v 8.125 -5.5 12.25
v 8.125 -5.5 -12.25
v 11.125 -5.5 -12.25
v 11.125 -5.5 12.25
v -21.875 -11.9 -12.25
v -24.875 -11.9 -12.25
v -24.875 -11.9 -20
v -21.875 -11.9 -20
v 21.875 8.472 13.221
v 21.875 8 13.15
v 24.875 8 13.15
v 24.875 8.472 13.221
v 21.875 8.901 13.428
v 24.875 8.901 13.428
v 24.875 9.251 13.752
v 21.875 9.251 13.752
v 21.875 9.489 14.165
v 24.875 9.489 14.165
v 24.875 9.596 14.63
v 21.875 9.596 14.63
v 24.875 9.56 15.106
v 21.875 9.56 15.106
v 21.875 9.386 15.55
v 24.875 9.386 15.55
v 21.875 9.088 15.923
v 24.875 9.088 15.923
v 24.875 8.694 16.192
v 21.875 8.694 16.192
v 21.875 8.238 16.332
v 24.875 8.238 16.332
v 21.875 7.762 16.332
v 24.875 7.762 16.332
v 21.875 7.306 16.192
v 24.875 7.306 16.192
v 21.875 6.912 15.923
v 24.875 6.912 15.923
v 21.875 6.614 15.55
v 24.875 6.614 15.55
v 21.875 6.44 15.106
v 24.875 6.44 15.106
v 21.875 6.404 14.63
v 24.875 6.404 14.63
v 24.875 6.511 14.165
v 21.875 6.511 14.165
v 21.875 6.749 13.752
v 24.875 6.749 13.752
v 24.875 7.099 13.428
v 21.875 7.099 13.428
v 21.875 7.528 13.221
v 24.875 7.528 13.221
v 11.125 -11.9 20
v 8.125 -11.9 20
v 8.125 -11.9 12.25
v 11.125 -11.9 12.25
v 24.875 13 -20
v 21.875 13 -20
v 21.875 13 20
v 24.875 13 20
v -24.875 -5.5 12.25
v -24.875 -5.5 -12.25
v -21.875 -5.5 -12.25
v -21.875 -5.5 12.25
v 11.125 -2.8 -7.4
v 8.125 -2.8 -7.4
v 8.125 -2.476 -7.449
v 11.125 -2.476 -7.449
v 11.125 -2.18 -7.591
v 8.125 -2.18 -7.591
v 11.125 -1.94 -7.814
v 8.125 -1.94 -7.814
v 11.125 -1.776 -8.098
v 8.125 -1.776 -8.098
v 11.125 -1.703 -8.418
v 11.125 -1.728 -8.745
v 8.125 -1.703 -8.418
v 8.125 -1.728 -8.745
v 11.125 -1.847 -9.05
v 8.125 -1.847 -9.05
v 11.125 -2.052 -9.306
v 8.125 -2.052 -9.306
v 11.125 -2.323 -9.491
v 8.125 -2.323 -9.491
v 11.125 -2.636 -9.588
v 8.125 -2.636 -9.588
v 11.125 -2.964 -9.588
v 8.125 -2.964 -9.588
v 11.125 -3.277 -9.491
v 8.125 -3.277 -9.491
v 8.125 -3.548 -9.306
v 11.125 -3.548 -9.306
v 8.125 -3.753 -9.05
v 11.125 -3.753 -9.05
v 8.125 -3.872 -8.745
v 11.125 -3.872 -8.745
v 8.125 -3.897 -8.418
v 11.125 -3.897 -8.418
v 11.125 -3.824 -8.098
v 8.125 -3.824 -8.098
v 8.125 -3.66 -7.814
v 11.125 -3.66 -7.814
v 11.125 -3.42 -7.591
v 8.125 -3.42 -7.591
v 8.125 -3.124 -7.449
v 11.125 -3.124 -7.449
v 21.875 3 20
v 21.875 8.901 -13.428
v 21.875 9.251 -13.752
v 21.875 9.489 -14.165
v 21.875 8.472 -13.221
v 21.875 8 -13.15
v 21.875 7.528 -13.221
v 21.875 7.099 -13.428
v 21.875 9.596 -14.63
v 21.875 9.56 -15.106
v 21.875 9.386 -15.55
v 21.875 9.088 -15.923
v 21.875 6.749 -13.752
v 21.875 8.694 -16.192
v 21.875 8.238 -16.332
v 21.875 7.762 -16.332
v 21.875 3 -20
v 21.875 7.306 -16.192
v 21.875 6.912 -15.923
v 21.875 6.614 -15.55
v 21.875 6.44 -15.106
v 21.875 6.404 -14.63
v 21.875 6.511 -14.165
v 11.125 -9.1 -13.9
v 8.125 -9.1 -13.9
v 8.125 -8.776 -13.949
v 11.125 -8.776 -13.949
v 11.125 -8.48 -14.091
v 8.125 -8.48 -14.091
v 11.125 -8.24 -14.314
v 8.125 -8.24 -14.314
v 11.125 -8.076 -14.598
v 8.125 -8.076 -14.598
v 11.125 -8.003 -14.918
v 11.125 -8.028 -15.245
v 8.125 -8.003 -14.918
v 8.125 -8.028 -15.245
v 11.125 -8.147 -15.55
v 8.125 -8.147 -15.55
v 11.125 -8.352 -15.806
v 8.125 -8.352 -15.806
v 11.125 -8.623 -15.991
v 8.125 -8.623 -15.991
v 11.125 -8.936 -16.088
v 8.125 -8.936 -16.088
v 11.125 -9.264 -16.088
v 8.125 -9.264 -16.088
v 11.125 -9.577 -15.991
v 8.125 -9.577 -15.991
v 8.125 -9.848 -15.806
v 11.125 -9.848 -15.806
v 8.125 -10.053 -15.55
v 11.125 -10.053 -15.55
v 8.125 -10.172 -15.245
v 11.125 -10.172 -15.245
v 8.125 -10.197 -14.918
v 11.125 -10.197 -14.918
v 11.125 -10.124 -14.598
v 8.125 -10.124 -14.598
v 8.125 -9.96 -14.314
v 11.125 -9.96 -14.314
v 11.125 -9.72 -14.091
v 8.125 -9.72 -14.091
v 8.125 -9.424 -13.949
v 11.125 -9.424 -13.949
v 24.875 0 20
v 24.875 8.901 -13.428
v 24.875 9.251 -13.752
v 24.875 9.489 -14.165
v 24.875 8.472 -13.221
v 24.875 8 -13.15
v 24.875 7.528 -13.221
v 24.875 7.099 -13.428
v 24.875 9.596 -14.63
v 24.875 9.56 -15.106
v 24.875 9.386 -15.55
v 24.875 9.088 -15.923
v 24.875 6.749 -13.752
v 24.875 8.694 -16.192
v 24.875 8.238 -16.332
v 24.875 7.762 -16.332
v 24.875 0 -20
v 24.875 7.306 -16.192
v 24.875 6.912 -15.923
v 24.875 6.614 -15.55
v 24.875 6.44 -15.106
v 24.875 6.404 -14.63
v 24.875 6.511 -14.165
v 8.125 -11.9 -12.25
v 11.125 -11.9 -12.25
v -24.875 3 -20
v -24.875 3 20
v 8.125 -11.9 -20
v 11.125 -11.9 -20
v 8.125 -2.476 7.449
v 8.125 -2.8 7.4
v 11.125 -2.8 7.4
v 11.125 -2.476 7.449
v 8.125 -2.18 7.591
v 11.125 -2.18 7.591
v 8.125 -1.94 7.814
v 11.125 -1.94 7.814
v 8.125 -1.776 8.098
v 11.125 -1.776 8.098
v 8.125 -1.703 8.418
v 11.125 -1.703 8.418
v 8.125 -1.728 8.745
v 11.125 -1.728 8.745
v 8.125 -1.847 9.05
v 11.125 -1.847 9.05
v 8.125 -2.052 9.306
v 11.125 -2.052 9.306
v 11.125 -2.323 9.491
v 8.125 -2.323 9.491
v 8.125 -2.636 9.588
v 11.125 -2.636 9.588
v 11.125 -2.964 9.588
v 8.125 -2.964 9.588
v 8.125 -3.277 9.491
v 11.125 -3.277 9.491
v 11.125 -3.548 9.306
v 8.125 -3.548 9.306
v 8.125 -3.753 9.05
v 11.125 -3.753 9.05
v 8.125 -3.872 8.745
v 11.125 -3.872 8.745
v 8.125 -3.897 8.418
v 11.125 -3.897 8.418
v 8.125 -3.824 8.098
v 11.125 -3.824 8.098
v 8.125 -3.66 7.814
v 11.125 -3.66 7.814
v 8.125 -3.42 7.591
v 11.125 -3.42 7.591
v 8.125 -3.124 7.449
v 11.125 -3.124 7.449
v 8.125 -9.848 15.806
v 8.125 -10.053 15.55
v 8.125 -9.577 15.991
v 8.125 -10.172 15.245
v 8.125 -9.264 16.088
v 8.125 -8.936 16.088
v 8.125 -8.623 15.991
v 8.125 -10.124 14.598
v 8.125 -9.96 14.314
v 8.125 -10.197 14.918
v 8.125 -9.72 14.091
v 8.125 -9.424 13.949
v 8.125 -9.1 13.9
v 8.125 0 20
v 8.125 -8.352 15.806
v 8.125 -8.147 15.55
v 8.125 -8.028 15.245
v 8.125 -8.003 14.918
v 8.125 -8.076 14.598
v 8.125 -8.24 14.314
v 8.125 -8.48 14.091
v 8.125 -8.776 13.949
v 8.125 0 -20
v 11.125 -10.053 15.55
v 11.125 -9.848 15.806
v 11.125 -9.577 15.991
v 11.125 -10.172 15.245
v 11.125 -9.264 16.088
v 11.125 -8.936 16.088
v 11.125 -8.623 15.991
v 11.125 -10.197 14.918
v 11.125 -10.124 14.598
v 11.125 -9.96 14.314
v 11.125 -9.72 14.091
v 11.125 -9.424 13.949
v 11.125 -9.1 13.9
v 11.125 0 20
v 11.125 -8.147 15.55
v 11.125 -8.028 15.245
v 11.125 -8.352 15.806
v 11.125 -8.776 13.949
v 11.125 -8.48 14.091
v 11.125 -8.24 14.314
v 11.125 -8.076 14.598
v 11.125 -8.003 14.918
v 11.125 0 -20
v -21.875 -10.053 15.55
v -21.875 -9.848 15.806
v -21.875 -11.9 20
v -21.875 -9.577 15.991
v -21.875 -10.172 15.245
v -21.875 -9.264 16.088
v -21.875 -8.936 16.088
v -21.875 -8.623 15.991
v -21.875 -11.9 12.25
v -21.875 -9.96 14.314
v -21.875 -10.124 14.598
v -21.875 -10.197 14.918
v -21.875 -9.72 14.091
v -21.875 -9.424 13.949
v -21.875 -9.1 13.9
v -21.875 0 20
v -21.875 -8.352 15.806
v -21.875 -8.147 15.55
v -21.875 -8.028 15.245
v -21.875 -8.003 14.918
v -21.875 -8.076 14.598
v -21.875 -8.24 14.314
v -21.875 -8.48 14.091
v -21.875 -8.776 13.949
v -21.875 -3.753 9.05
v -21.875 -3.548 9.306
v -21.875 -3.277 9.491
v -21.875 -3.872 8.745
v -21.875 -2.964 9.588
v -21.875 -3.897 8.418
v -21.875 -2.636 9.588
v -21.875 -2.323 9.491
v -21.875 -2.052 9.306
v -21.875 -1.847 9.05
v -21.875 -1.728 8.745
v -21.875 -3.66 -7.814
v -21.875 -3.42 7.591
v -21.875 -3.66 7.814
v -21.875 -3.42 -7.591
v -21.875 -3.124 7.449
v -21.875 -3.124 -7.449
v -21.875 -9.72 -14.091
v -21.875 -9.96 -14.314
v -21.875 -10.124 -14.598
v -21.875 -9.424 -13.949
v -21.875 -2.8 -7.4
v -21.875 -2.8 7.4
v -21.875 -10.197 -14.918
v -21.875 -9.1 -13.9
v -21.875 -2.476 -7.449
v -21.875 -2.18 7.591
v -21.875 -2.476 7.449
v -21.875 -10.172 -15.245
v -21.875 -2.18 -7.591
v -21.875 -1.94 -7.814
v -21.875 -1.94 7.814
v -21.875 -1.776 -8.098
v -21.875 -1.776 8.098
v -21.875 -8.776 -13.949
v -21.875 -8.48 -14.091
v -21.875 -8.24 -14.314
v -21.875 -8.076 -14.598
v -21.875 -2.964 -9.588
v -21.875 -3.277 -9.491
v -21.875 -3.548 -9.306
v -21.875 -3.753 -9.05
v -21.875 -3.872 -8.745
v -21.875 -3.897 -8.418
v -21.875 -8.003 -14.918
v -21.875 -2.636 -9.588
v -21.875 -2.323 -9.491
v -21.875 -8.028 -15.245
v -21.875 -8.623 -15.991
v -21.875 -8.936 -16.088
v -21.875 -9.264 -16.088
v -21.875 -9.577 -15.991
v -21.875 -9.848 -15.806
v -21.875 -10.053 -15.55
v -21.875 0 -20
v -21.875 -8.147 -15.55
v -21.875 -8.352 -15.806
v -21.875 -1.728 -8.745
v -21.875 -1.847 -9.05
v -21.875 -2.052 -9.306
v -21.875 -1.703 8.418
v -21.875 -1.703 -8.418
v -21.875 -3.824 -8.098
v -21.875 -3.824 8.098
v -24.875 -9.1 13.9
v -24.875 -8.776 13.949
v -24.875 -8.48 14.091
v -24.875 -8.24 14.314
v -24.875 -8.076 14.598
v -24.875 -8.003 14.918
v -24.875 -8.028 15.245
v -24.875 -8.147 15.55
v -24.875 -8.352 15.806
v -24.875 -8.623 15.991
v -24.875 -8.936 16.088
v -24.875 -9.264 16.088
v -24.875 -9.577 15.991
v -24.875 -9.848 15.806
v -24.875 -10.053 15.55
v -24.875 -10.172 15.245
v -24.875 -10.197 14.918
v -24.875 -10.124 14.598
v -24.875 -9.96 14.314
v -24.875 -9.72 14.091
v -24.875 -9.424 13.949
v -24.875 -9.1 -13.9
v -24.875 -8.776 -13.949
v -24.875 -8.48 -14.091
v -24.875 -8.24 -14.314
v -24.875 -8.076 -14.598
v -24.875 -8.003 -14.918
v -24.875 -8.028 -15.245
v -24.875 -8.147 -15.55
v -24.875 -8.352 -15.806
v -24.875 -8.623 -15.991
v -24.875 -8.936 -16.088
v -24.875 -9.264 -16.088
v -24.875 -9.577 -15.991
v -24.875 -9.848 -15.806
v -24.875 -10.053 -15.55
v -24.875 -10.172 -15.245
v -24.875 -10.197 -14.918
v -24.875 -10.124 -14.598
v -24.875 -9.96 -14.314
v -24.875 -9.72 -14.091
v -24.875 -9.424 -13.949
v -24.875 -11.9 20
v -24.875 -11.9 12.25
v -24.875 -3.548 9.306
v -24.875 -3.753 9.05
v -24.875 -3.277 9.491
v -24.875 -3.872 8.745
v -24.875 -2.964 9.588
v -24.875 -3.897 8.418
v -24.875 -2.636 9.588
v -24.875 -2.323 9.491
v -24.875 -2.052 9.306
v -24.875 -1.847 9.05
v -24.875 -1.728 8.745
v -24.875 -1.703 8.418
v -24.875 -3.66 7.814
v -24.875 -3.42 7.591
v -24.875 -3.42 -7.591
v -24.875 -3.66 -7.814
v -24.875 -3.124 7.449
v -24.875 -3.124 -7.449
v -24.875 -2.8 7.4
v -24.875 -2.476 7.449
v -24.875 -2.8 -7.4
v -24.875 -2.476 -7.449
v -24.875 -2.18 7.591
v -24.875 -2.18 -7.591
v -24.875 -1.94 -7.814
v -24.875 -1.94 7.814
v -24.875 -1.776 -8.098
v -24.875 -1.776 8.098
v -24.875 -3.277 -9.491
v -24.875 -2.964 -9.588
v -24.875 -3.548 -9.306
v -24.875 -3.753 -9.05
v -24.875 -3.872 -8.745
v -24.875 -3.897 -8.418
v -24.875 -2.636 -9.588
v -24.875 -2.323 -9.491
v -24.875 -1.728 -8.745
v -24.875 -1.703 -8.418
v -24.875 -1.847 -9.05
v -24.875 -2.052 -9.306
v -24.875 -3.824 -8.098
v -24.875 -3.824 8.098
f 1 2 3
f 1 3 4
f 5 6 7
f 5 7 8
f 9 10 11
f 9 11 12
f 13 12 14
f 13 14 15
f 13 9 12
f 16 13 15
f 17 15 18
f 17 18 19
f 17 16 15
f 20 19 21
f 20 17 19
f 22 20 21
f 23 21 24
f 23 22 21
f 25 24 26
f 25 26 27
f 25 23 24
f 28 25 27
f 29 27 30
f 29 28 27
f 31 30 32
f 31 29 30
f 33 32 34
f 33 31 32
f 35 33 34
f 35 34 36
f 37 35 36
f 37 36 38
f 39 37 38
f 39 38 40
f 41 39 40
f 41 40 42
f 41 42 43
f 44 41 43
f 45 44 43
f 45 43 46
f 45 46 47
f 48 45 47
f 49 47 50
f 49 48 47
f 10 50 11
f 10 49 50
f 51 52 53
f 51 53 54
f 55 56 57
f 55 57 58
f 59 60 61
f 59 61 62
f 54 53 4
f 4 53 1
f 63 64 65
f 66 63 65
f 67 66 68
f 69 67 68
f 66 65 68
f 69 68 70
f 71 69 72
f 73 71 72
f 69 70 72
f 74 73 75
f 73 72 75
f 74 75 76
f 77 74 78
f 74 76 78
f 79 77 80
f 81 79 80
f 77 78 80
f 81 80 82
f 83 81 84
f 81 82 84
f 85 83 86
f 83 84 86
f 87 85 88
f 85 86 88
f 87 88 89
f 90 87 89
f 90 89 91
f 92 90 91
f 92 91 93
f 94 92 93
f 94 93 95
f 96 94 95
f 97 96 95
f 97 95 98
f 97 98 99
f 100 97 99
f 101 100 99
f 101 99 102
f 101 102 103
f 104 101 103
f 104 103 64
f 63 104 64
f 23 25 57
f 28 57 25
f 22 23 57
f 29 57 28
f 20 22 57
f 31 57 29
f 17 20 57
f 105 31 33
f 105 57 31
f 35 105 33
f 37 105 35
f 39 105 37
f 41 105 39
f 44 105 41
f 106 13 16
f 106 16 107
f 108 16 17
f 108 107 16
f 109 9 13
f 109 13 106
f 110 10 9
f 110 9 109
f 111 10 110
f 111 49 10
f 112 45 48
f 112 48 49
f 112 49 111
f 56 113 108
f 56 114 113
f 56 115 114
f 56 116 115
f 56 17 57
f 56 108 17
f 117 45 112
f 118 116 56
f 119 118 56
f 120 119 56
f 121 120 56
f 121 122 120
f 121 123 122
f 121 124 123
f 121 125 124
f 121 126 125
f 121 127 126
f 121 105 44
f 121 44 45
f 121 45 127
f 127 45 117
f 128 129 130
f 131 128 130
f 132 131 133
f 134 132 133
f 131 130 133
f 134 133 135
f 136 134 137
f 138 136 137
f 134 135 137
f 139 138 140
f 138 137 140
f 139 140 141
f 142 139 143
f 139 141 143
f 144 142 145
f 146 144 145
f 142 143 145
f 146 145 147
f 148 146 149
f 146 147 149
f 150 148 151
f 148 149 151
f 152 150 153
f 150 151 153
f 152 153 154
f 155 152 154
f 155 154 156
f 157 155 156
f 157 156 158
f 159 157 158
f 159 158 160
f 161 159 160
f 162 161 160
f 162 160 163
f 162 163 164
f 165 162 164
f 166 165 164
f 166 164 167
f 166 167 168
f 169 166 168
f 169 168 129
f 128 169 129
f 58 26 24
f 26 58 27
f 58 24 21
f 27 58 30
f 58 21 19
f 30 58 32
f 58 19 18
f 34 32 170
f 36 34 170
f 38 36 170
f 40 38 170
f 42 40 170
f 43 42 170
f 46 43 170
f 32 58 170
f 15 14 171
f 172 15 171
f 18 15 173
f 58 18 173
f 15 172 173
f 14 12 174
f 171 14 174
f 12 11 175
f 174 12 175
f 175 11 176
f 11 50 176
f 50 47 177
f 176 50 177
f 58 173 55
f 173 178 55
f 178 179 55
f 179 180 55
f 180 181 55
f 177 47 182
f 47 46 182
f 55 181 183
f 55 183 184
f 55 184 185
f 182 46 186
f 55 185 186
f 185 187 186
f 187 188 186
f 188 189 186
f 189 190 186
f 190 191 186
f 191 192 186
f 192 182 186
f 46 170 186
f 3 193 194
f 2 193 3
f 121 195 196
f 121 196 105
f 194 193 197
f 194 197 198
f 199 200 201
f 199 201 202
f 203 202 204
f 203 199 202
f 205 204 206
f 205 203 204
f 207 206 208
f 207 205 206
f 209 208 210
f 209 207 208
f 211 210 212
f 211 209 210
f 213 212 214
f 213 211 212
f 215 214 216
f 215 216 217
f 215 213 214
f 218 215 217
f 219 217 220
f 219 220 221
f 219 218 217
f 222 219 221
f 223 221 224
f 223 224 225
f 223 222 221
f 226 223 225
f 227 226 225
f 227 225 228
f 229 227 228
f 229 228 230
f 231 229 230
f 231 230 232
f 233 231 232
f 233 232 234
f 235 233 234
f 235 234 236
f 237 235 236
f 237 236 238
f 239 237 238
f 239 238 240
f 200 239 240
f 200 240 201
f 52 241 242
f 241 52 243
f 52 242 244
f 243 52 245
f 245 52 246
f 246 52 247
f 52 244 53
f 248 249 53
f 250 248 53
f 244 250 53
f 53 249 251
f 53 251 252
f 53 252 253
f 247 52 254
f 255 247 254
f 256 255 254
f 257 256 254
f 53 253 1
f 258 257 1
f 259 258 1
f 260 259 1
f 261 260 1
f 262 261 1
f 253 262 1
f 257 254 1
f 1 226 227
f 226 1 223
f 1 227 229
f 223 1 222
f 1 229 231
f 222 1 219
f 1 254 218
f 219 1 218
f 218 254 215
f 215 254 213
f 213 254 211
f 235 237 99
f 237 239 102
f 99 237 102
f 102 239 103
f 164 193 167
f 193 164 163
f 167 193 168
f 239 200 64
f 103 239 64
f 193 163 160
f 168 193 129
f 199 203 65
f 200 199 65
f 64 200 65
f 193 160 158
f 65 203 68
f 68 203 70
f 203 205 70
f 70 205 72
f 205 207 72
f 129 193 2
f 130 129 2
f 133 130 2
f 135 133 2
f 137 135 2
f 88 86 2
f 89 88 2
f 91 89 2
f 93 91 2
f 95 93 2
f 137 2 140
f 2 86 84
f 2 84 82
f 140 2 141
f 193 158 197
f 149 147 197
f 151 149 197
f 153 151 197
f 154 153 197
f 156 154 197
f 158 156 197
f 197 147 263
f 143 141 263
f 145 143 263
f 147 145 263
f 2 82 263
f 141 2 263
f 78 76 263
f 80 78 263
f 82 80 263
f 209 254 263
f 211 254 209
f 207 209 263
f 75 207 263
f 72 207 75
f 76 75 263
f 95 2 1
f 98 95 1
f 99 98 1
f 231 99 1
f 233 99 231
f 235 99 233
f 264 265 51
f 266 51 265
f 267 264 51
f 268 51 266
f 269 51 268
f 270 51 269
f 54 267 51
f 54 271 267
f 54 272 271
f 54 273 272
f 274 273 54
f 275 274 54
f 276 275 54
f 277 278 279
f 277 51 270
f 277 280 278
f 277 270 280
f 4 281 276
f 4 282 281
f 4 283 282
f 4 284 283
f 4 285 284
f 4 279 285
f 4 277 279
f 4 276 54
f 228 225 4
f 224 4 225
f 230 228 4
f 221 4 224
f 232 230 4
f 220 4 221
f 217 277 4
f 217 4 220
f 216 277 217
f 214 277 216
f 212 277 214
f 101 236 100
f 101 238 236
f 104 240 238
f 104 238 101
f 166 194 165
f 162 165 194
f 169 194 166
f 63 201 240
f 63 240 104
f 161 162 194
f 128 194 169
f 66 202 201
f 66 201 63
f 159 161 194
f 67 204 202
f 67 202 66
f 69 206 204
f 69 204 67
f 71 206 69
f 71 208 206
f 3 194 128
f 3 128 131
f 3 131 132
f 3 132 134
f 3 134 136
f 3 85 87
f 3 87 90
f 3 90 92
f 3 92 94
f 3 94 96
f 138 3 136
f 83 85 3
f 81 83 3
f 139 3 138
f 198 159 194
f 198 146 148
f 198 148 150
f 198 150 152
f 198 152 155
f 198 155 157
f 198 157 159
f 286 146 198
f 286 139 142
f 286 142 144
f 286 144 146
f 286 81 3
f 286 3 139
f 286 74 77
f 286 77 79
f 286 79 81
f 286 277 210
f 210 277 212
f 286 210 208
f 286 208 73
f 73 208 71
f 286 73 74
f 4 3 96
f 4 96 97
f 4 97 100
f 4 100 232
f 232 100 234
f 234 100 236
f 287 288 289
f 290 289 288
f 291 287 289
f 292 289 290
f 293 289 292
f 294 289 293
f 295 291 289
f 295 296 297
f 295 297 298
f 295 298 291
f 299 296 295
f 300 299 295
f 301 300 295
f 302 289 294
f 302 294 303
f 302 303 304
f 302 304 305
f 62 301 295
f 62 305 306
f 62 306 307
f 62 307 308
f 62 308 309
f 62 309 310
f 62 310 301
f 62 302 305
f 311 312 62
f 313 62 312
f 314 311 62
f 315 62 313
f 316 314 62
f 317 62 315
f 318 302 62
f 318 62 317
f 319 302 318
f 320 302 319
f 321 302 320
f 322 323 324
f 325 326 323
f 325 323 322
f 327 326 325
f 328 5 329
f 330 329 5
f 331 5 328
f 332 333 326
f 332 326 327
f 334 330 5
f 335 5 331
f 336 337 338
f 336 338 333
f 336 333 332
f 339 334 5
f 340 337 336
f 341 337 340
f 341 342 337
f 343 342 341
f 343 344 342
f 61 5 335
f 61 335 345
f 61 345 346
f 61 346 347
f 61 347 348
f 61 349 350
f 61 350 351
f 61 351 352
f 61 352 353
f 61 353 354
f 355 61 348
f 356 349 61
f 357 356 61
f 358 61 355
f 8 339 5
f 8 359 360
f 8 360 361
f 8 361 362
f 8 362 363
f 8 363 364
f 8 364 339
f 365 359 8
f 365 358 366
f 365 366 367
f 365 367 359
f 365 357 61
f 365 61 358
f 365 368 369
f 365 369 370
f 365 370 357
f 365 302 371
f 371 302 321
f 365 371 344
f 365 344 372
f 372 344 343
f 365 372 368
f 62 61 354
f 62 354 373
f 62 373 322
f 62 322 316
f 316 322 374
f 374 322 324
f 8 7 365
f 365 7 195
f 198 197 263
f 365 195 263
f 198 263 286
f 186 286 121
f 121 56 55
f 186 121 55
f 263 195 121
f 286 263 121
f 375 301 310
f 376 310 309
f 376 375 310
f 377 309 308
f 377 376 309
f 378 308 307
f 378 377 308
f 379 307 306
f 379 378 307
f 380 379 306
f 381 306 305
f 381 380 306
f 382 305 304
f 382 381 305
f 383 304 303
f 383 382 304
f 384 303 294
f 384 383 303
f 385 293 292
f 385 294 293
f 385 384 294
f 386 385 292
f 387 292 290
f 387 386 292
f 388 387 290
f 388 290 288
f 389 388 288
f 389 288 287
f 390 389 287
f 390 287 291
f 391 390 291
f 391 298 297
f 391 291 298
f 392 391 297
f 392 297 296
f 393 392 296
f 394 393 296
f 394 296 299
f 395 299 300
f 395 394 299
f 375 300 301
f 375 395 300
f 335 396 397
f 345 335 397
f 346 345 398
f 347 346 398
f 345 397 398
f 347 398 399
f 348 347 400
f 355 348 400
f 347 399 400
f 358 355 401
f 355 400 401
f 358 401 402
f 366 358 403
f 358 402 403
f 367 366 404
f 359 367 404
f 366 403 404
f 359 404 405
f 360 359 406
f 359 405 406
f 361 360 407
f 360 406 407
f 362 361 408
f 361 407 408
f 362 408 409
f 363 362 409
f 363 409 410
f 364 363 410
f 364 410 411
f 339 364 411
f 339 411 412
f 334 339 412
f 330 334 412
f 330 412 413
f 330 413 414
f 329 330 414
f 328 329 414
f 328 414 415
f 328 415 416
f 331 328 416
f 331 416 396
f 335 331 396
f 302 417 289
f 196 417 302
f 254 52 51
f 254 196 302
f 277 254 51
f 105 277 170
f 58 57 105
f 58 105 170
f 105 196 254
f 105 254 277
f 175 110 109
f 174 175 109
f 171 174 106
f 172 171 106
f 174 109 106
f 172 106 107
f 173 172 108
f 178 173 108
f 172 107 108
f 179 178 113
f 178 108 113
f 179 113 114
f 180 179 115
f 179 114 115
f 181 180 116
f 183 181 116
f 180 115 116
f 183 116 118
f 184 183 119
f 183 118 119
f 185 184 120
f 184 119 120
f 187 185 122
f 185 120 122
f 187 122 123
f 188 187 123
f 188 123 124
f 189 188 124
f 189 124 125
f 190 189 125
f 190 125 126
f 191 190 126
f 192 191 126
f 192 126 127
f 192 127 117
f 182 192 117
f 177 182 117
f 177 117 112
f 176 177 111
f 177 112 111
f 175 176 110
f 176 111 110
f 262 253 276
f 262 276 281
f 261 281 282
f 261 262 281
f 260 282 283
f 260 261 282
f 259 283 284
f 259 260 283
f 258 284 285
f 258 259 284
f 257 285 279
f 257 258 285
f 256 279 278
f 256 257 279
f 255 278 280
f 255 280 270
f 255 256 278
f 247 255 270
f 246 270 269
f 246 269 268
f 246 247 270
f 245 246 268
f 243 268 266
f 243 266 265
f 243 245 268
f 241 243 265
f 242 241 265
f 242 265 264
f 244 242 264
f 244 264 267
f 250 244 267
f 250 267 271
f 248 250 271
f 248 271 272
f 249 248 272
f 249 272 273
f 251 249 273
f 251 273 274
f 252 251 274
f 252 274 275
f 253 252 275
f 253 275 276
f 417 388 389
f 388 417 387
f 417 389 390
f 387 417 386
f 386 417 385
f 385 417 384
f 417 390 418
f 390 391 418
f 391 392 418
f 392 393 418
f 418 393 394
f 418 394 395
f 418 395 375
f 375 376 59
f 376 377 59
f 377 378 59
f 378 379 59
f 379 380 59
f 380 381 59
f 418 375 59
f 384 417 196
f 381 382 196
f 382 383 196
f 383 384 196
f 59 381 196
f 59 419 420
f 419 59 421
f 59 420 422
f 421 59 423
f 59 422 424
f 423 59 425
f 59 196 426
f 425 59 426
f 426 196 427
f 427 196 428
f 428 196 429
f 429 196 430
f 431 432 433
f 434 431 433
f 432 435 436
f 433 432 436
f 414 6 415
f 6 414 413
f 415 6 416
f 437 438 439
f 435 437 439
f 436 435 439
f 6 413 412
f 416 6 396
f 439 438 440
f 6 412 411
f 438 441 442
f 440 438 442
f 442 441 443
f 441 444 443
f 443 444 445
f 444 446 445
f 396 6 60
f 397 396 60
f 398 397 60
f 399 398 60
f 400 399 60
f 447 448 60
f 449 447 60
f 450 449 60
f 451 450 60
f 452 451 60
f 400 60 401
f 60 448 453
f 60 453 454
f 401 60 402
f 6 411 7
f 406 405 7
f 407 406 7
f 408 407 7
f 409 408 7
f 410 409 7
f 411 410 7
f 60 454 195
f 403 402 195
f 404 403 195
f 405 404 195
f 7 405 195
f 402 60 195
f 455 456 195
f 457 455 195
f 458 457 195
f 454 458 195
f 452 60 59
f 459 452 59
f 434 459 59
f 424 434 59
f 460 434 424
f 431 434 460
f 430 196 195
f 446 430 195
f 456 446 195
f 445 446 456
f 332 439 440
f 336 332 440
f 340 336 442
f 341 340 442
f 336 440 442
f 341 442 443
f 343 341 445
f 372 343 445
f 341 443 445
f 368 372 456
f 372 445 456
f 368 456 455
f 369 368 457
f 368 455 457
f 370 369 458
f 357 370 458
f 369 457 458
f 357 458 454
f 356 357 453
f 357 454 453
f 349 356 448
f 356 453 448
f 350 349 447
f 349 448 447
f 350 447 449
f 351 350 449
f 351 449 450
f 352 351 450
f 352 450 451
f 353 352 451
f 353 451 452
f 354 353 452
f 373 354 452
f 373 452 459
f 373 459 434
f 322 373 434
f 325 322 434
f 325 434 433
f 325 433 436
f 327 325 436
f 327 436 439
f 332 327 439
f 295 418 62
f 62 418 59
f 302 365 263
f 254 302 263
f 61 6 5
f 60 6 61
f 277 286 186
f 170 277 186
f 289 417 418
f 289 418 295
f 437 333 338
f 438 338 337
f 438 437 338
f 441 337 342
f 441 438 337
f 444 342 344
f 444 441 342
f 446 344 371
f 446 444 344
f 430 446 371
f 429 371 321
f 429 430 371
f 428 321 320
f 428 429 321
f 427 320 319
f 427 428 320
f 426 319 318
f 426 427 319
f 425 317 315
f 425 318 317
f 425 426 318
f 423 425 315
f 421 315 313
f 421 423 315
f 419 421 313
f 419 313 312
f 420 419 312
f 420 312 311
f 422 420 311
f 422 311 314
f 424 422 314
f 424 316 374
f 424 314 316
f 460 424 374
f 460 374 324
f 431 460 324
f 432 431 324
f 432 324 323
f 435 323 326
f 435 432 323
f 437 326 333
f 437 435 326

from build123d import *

# Parameters (mm, degrees)
SKETCH2_W           = 49.75
SKETCH2_H           = 40
BOSS_EXTRUDE1_DEPTH = 3
SKETCH2_4_W         = 3
SKETCH2_4_H         = 40
BOSS_EXTRUDE3_DEPTH = 11.9
SKETCH2_5_W         = 3
SKETCH2_5_H         = 40
BOSS_EXTRUDE4_DEPTH = 13
CUT_EXTRUDE1_REACH  = 57.173
SKETCH3_R           = 1.1
SKETCH3_W           = 24.5
SKETCH3_H           = 6.4
SKETCH4_R           = 1.6
CUT_EXTRUDE2_DEPTH  = 3


with BuildPart() as part:
    # Sketch2 → Boss-Extrude1 (new body)
    with BuildSketch(Plane(origin=(0, 0, 0), x_dir=(1, 0, 0), z_dir=(0, 1, 0))):
        Rectangle(SKETCH2_W, SKETCH2_H)
    extrude(amount=BOSS_EXTRUDE1_DEPTH)

    # Sketch2<4> → Boss-Extrude3 (add)
    with BuildSketch(Plane(origin=(0, 0, 0), x_dir=(1, 0, 0), z_dir=(0, 1, 0))):
        with Locations((9.625, 0)):
            Rectangle(SKETCH2_4_W, SKETCH2_4_H)
        with Locations((-23.375, 0)):
            Rectangle(SKETCH2_4_W, SKETCH2_4_H)
    extrude(amount=-BOSS_EXTRUDE3_DEPTH)

    # Sketch2<5> → Boss-Extrude4 (add)
    with BuildSketch(Plane(origin=(0, 0, 0), x_dir=(1, 0, 0), z_dir=(0, 1, 0))):
        with Locations((23.375, 0)):
            Rectangle(SKETCH2_5_W, SKETCH2_5_H)
    extrude(amount=BOSS_EXTRUDE4_DEPTH)

    # Cut-Extrude1: up to this face of the body (flat: up to its plane)
    cut_extrude1_end = Plane(part.part.faces().sort_by_distance((11.125, -5.95, 0))[0])
    # Sketch3 → Cut-Extrude1 (cut, up to the picked face)
    with BuildSketch(Plane.ZY.offset(24.875), mode=Mode.PRIVATE) as cut_extrude1_sk1:
        with Locations((-8.5, -2.8)):
            Circle(SKETCH3_R)
    cut_extrude1_tool1 = split(extrude(cut_extrude1_sk1.sketch, amount=-CUT_EXTRUDE1_REACH, mode=Mode.PRIVATE), bisect_by=cut_extrude1_end, keep=Keep.BOTH, mode=Mode.PRIVATE)
    # Sketch3 → Cut-Extrude1 (cut, up to the picked face)
    with BuildSketch(Plane.ZY.offset(24.875), mode=Mode.PRIVATE) as cut_extrude1_sk2:
        with Locations((-15, -9.1)):
            Circle(SKETCH3_R)
    cut_extrude1_tool2 = split(extrude(cut_extrude1_sk2.sketch, amount=-CUT_EXTRUDE1_REACH, mode=Mode.PRIVATE), bisect_by=cut_extrude1_end, keep=Keep.BOTH, mode=Mode.PRIVATE)
    # Sketch3 → Cut-Extrude1 (cut, up to the picked face)
    with BuildSketch(Plane.ZY.offset(24.875), mode=Mode.PRIVATE) as cut_extrude1_sk3:
        with Locations((0, -8.7)):
            Rectangle(SKETCH3_W, SKETCH3_H)
    cut_extrude1_tool3 = split(extrude(cut_extrude1_sk3.sketch, amount=-CUT_EXTRUDE1_REACH, mode=Mode.PRIVATE), bisect_by=cut_extrude1_end, keep=Keep.BOTH, mode=Mode.PRIVATE)
    cut_extrude1_1 = cut_extrude1_tool1.solids().sort_by(Axis((-24.875, -2.8, -8.5), (1, 0, 0)))[0]
    add(cut_extrude1_1, mode=Mode.SUBTRACT)
    cut_extrude1_2 = cut_extrude1_tool2.solids().sort_by(Axis((-24.875, -9.1, -15), (1, 0, 0)))[0]
    add(cut_extrude1_2, mode=Mode.SUBTRACT)
    cut_extrude1_3 = cut_extrude1_tool3.solids().sort_by(Axis((-24.875, -8.7, 0), (1, 0, 0)))[0]
    add(cut_extrude1_3, mode=Mode.SUBTRACT)
    cut_extrude1 = cut_extrude1_1 + cut_extrude1_2 + cut_extrude1_3  # Cut-Extrude1 as one shape, for the pattern or mirror that repeats it

    # Sketch4 → Cut-Extrude2 (cut)
    with BuildSketch(Plane.ZY.offset(-21.875)):
        with Locations((-14.75, 8)):
            Circle(SKETCH4_R)
    cut_extrude2 = extrude(amount=-CUT_EXTRUDE2_DEPTH, mode=Mode.SUBTRACT)

    # Mirror2: Cut-Extrude1, Cut-Extrude2 across plane
    add(cut_extrude1.mirror(Plane.XY), mode=Mode.SUBTRACT)
    add(cut_extrude2.mirror(Plane.XY), mode=Mode.SUBTRACT)


solid = part.part
